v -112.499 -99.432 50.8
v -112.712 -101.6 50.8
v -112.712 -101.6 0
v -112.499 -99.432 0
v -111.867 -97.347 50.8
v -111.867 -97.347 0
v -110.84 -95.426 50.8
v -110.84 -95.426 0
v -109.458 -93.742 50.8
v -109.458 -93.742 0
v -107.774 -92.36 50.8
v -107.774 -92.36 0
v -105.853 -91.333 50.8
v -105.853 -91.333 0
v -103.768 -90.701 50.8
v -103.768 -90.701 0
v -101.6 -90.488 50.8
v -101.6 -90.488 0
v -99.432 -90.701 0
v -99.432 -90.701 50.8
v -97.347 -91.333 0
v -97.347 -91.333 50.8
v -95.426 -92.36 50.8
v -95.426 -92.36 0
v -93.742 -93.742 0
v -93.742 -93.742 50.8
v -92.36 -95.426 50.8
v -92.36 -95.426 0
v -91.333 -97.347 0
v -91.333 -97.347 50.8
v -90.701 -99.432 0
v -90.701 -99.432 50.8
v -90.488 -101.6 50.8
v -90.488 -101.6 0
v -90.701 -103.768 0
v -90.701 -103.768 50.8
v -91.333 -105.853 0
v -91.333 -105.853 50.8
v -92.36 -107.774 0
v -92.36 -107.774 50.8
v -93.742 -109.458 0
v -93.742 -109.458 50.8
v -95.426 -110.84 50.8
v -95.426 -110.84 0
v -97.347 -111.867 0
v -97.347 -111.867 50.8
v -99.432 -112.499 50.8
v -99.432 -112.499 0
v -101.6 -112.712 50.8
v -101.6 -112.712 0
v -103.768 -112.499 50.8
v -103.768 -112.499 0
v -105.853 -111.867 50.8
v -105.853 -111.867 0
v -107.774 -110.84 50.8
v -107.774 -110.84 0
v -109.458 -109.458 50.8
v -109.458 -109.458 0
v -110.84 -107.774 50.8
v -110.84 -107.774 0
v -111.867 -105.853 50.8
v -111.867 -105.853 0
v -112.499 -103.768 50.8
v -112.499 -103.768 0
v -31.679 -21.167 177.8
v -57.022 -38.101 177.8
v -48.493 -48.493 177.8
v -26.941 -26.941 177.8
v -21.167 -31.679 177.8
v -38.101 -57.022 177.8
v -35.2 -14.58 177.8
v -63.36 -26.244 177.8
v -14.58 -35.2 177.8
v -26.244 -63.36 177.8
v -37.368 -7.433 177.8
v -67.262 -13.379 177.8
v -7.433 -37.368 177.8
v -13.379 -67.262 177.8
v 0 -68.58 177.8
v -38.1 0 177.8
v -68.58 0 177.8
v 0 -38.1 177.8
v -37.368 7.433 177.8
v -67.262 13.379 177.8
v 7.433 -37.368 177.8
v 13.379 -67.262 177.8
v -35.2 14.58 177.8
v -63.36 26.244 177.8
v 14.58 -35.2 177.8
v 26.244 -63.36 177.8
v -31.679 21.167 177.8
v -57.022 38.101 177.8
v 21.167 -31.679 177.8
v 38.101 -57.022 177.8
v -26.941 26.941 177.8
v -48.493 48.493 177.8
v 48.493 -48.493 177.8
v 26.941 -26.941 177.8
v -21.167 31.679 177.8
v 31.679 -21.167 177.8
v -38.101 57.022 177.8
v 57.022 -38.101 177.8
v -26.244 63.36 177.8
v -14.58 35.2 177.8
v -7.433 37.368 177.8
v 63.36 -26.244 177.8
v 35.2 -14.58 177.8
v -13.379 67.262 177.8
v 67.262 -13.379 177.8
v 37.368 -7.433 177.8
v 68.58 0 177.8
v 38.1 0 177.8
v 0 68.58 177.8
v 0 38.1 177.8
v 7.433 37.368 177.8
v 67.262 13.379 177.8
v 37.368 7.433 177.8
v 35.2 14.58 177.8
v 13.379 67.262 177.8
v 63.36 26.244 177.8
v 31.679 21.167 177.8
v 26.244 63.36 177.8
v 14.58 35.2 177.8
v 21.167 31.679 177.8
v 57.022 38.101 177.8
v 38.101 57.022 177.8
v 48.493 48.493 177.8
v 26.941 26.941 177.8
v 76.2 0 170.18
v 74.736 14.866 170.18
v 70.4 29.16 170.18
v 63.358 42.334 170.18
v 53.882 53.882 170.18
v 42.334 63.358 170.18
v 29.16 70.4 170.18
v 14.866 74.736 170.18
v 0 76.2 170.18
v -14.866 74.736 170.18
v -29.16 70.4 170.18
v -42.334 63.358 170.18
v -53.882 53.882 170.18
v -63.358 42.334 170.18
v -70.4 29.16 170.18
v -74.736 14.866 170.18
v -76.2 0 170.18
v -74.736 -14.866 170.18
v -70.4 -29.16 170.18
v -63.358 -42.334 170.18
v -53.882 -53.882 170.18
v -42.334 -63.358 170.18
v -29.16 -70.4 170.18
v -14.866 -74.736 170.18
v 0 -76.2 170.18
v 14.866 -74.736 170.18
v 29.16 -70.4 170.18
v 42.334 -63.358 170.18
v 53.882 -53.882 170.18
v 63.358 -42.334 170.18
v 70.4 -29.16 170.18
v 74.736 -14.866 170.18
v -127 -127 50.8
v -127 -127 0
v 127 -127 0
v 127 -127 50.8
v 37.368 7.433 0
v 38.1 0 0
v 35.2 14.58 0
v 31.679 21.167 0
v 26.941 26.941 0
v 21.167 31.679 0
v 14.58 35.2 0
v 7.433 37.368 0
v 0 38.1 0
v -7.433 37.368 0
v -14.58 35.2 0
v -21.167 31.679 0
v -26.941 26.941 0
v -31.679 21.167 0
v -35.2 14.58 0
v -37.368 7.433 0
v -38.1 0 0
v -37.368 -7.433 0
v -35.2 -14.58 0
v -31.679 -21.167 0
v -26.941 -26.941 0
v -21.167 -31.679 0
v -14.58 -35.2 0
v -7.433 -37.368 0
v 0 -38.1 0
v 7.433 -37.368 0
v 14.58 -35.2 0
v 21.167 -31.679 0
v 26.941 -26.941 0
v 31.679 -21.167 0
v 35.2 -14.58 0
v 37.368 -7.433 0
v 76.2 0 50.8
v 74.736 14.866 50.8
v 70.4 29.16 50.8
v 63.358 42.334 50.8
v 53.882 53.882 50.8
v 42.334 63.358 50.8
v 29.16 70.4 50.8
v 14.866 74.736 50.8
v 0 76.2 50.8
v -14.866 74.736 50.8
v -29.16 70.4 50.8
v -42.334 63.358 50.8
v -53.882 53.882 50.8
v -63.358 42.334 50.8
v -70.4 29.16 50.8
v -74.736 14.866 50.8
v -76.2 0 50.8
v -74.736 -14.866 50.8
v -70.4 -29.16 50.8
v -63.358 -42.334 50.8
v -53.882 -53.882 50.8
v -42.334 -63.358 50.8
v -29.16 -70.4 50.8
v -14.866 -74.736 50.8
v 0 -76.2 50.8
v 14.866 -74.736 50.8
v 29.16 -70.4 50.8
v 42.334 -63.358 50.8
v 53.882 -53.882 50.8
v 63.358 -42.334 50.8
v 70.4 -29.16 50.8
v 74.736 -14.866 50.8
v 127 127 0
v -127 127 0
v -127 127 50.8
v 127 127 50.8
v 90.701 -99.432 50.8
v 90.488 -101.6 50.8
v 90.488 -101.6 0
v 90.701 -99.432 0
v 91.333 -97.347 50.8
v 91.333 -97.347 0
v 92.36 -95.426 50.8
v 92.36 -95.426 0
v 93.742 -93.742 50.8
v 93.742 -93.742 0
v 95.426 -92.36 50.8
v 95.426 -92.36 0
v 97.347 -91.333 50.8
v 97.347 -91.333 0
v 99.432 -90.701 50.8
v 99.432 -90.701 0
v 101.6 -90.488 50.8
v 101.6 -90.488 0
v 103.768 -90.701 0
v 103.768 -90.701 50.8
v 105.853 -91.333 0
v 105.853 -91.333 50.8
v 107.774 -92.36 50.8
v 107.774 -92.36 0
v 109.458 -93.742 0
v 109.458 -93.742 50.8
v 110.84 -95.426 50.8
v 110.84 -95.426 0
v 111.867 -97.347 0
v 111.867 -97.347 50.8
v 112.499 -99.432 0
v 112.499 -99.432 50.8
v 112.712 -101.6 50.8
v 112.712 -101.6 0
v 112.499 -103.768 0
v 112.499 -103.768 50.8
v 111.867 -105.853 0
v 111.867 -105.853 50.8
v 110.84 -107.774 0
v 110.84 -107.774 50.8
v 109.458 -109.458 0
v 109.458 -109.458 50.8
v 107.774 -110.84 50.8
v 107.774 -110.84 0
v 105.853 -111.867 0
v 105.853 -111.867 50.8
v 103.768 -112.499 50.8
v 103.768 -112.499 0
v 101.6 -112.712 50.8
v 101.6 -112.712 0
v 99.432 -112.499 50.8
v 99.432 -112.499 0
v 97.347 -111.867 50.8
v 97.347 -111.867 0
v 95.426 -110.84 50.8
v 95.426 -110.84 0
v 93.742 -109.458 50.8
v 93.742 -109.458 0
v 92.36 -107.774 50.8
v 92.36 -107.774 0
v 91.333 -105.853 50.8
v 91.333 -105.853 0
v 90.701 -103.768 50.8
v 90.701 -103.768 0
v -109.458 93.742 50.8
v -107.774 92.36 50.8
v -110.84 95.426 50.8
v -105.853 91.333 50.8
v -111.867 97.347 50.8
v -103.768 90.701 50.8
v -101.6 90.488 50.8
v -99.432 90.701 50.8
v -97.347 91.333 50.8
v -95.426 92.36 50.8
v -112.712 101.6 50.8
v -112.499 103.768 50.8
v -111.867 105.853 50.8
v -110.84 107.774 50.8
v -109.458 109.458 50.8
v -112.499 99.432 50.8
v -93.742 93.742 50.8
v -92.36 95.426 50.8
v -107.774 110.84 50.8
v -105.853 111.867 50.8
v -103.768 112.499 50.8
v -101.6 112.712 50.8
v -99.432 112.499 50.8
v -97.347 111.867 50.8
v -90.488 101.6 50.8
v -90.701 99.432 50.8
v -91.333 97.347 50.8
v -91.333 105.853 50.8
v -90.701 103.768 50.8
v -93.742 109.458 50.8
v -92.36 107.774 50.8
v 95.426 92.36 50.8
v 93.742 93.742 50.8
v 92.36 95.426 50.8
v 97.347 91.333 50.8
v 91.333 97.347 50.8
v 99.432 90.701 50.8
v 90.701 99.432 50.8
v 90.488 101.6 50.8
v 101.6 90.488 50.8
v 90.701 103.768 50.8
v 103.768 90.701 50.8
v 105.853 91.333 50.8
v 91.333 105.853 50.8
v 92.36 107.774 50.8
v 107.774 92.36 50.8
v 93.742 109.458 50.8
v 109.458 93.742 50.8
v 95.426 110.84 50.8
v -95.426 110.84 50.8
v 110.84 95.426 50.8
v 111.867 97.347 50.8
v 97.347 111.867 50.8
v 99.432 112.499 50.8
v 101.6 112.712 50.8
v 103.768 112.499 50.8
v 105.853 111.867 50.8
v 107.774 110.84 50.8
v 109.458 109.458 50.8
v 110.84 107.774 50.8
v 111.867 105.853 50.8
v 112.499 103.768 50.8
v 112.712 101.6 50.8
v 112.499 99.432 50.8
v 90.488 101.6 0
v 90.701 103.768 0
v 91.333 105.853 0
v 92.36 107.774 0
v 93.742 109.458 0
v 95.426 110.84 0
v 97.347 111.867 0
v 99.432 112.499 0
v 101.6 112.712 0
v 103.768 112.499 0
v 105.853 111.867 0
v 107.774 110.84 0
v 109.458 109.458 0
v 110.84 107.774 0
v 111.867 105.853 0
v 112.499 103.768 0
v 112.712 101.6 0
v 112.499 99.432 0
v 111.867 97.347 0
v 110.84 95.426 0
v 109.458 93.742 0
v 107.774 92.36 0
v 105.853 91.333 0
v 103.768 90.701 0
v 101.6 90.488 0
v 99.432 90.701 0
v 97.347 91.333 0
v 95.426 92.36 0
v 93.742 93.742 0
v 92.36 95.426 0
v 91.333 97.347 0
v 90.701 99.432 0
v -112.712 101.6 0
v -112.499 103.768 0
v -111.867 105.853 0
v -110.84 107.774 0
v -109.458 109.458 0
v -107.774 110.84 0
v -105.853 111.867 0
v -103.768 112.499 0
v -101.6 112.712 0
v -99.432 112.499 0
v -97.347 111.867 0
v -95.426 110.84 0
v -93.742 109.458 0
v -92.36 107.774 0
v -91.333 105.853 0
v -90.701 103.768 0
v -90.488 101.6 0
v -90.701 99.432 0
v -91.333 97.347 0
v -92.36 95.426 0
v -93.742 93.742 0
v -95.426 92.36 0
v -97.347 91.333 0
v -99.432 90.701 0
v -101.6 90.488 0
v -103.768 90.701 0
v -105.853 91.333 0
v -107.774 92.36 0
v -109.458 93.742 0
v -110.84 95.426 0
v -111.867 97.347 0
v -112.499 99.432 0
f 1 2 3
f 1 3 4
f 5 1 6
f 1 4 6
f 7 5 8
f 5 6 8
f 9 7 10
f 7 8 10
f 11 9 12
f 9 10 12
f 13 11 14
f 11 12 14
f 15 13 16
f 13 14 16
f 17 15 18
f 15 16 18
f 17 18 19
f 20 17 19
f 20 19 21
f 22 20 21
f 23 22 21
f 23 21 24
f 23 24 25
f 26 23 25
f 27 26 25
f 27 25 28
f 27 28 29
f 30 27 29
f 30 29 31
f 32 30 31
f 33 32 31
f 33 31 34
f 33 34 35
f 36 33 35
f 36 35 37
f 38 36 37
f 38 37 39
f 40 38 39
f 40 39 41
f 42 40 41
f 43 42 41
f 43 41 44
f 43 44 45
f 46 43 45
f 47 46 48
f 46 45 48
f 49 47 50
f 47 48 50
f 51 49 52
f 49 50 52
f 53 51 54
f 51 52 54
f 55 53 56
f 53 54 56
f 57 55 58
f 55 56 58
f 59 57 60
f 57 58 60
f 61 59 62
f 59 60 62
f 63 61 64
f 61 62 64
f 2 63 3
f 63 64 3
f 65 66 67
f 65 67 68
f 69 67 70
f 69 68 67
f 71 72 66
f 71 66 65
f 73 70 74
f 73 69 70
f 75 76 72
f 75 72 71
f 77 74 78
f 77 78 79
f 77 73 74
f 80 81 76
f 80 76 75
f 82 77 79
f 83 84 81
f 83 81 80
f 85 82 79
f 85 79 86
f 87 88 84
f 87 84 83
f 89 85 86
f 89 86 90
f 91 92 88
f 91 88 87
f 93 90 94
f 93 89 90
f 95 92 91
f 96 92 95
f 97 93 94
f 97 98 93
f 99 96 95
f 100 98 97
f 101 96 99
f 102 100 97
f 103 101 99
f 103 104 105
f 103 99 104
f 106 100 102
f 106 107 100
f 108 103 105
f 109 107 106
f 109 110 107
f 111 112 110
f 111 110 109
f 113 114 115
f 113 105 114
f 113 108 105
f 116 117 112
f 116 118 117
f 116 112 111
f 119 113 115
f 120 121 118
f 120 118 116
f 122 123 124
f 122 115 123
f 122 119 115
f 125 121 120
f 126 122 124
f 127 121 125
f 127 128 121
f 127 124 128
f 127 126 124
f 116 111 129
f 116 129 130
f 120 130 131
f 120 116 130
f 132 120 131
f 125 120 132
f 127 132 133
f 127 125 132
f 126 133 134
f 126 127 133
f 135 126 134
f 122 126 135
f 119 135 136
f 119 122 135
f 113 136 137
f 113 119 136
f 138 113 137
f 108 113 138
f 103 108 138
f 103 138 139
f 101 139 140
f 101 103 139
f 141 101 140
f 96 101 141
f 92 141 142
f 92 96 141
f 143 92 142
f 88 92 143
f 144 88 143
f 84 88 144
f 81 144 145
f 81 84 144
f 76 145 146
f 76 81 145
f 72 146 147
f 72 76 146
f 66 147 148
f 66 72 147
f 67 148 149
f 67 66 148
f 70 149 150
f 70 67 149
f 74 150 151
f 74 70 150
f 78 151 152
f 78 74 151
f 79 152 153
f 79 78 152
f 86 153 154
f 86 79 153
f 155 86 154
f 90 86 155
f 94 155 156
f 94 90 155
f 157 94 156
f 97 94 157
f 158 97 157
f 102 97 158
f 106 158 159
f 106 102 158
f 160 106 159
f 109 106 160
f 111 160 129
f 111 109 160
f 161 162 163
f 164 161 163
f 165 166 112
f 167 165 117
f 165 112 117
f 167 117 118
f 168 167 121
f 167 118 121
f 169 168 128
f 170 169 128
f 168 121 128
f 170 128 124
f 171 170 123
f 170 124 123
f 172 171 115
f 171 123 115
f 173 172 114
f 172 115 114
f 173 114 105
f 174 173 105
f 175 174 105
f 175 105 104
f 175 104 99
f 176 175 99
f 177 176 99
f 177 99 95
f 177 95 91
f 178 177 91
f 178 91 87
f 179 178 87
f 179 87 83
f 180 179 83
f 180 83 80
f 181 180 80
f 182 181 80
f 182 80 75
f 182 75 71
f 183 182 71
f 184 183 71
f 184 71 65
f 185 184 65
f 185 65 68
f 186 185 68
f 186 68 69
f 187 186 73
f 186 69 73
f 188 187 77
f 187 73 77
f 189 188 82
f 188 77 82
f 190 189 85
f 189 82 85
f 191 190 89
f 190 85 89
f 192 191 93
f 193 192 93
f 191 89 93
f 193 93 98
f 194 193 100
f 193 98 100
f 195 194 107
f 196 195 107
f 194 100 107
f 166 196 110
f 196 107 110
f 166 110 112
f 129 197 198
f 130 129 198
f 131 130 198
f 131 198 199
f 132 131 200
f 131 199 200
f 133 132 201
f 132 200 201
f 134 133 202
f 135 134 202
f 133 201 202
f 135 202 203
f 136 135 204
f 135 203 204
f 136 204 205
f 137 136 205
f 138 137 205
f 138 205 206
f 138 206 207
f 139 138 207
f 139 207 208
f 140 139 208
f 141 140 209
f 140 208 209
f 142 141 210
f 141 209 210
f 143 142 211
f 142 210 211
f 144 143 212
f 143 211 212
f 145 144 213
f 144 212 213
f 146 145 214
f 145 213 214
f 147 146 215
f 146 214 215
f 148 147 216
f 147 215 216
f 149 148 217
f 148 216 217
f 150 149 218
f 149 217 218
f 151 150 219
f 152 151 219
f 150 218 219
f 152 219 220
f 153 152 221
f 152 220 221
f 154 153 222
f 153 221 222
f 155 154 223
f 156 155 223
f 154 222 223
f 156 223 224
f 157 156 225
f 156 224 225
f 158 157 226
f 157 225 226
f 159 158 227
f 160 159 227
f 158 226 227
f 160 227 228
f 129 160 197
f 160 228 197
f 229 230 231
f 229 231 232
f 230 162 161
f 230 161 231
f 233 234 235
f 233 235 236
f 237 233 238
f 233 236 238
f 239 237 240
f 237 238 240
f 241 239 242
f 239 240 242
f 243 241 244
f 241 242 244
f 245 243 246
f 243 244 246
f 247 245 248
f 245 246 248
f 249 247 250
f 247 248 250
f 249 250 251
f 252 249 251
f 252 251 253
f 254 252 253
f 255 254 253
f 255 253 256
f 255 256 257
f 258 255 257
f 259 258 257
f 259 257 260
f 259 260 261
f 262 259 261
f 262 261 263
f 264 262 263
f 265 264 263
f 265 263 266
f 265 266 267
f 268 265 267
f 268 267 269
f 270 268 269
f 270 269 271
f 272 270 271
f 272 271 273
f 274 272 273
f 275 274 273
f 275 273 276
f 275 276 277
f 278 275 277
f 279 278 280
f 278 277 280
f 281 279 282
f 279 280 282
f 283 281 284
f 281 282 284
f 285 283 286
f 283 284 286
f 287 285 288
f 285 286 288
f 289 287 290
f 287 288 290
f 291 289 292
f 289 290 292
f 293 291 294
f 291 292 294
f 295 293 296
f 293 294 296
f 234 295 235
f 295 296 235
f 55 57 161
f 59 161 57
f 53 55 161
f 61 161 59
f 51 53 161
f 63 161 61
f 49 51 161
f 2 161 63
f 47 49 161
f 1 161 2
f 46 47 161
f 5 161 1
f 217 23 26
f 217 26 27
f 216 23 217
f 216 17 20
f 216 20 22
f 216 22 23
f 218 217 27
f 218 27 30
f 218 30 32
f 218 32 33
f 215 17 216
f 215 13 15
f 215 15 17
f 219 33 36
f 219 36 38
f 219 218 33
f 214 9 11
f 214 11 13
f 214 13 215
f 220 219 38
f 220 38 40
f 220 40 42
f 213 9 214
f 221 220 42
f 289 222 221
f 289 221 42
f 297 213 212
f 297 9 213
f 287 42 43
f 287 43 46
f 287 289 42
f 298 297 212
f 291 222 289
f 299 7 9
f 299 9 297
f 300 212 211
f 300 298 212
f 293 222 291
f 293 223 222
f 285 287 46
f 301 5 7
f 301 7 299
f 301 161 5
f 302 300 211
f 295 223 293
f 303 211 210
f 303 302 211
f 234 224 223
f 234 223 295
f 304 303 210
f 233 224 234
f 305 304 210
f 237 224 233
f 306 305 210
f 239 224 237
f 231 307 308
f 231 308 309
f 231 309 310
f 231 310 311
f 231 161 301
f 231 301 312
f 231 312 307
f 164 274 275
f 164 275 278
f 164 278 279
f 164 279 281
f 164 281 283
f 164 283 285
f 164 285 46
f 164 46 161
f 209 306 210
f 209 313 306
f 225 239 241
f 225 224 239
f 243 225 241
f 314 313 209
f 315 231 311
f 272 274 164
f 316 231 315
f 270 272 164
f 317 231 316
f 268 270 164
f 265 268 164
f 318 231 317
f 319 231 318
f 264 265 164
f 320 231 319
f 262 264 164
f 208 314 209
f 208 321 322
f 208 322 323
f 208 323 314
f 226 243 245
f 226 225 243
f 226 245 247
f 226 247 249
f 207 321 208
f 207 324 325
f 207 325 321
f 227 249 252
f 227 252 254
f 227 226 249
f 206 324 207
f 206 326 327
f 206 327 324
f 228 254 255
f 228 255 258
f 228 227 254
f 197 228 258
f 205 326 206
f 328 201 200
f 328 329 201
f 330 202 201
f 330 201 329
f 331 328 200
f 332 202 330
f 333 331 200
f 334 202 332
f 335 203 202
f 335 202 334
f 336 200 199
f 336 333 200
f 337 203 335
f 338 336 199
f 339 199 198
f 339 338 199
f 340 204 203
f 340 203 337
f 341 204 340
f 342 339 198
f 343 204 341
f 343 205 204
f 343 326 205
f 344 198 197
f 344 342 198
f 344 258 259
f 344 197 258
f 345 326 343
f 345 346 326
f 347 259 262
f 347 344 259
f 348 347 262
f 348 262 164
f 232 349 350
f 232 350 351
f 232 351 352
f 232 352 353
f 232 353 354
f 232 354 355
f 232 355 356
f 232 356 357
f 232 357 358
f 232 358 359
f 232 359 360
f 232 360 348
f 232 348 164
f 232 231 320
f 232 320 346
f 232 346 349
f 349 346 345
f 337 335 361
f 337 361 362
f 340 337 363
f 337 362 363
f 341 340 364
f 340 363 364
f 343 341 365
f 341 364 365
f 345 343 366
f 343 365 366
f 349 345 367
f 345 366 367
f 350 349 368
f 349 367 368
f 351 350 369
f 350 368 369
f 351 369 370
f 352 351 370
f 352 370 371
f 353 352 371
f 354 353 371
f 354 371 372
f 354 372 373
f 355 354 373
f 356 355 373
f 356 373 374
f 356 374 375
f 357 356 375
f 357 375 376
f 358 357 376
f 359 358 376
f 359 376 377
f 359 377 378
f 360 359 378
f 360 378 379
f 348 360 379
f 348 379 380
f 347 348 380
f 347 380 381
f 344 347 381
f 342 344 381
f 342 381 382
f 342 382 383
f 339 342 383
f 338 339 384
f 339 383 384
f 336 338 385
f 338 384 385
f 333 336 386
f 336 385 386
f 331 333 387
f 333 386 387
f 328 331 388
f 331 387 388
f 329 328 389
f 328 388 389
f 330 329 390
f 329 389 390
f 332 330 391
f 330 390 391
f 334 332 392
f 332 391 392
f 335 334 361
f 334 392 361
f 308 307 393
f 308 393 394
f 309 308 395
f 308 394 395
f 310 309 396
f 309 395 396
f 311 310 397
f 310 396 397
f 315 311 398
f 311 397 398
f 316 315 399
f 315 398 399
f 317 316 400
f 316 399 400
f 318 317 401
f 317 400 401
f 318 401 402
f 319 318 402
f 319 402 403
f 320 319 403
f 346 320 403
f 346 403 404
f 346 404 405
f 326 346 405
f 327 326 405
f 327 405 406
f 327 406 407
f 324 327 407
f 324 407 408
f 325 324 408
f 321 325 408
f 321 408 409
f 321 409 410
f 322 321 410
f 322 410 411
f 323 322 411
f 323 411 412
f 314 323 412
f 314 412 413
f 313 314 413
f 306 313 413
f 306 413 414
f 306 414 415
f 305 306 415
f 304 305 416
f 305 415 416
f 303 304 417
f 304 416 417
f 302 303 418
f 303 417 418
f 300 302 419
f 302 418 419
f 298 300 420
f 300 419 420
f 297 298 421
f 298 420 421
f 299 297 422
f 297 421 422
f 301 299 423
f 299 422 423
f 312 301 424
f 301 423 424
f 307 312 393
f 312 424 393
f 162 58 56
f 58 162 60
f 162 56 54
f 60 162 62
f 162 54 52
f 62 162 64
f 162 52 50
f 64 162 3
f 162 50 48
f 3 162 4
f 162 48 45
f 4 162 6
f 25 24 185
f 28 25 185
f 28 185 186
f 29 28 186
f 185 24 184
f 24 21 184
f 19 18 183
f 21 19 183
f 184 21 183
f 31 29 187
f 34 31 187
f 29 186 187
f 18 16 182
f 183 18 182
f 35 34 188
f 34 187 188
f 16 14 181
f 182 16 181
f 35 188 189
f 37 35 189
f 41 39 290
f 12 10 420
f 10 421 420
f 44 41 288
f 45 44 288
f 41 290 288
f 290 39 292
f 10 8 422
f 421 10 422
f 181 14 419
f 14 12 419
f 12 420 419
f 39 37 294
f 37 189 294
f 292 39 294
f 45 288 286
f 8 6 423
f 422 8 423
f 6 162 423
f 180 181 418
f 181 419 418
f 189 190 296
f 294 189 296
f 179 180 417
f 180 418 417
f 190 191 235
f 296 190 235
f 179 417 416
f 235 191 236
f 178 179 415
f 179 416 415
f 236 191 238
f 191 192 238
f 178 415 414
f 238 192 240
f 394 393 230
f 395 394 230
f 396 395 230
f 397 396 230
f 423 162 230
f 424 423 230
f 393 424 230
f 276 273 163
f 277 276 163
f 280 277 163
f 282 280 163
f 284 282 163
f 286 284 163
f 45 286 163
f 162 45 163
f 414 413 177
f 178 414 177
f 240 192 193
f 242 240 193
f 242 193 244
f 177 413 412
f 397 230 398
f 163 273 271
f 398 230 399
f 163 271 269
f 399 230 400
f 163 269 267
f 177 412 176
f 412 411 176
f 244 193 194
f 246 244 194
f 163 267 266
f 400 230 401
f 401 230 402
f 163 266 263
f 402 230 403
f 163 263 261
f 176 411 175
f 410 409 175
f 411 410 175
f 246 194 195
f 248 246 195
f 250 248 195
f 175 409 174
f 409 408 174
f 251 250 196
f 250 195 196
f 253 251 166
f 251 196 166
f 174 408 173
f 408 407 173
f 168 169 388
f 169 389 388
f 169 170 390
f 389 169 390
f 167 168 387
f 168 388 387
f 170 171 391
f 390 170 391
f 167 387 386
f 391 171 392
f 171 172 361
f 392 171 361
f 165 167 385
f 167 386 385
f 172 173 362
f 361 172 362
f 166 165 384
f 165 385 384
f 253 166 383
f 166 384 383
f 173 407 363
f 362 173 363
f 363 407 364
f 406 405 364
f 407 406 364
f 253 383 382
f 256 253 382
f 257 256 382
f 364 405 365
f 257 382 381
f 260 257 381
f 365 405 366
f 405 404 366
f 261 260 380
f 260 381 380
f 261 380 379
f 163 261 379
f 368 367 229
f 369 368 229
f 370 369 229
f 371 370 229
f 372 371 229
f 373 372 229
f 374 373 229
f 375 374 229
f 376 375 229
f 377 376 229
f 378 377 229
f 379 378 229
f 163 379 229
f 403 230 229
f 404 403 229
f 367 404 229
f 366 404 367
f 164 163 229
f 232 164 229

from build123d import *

# Parameters (mm, degrees)
SKETCH1_W                    = 254
SKETCH1_H                    = 254
BOSS_EXTRUDE1_DEPTH          = 50.8
SKETCH2_R                    = 76.2
BOSS_EXTRUDE2_DEPTH          = 127
CHAMFER1_SIZE                = 7.62
SKETCH3_R                    = 38.1
CUT_EXTRUDE1_DEPTH           = 178.8
F_7_8_0_875_DIAMETER_HOLE1_D = 22.225


with BuildPart() as part:
    # Sketch1 → Boss-Extrude1 (new body)
    with BuildSketch(Plane.XY):
        Rectangle(SKETCH1_W, SKETCH1_H)
    extrude(amount=BOSS_EXTRUDE1_DEPTH)

    # Sketch2 → Boss-Extrude2 (add)
    with BuildSketch(Plane.XY.offset(50.8)):
        Circle(SKETCH2_R)
    extrude(amount=BOSS_EXTRUDE2_DEPTH)

    # Chamfer1
    chamfer1_edges = [part.edges().sort_by_distance(p)[0] for p in [
        (-76.2, 0, 177.8),
    ]]
    chamfer(chamfer1_edges, length=CHAMFER1_SIZE)

    # Sketch3 → Cut-Extrude1 (cut, through all)
    with BuildSketch(Plane.XY.offset(177.8)):
        Circle(SKETCH3_R)
    extrude(amount=-CUT_EXTRUDE1_DEPTH, mode=Mode.SUBTRACT)

    # 7/8 (0.875) Diameter Hole1 (through all)
    with Locations(Plane.XY.offset(50.8)):
        with Locations((-101.6, 101.6), (101.6, 101.6), (101.6, -101.6), (-101.6, -101.6)):
            Hole(F_7_8_0_875_DIAMETER_HOLE1_D / 2)


solid = part.part
